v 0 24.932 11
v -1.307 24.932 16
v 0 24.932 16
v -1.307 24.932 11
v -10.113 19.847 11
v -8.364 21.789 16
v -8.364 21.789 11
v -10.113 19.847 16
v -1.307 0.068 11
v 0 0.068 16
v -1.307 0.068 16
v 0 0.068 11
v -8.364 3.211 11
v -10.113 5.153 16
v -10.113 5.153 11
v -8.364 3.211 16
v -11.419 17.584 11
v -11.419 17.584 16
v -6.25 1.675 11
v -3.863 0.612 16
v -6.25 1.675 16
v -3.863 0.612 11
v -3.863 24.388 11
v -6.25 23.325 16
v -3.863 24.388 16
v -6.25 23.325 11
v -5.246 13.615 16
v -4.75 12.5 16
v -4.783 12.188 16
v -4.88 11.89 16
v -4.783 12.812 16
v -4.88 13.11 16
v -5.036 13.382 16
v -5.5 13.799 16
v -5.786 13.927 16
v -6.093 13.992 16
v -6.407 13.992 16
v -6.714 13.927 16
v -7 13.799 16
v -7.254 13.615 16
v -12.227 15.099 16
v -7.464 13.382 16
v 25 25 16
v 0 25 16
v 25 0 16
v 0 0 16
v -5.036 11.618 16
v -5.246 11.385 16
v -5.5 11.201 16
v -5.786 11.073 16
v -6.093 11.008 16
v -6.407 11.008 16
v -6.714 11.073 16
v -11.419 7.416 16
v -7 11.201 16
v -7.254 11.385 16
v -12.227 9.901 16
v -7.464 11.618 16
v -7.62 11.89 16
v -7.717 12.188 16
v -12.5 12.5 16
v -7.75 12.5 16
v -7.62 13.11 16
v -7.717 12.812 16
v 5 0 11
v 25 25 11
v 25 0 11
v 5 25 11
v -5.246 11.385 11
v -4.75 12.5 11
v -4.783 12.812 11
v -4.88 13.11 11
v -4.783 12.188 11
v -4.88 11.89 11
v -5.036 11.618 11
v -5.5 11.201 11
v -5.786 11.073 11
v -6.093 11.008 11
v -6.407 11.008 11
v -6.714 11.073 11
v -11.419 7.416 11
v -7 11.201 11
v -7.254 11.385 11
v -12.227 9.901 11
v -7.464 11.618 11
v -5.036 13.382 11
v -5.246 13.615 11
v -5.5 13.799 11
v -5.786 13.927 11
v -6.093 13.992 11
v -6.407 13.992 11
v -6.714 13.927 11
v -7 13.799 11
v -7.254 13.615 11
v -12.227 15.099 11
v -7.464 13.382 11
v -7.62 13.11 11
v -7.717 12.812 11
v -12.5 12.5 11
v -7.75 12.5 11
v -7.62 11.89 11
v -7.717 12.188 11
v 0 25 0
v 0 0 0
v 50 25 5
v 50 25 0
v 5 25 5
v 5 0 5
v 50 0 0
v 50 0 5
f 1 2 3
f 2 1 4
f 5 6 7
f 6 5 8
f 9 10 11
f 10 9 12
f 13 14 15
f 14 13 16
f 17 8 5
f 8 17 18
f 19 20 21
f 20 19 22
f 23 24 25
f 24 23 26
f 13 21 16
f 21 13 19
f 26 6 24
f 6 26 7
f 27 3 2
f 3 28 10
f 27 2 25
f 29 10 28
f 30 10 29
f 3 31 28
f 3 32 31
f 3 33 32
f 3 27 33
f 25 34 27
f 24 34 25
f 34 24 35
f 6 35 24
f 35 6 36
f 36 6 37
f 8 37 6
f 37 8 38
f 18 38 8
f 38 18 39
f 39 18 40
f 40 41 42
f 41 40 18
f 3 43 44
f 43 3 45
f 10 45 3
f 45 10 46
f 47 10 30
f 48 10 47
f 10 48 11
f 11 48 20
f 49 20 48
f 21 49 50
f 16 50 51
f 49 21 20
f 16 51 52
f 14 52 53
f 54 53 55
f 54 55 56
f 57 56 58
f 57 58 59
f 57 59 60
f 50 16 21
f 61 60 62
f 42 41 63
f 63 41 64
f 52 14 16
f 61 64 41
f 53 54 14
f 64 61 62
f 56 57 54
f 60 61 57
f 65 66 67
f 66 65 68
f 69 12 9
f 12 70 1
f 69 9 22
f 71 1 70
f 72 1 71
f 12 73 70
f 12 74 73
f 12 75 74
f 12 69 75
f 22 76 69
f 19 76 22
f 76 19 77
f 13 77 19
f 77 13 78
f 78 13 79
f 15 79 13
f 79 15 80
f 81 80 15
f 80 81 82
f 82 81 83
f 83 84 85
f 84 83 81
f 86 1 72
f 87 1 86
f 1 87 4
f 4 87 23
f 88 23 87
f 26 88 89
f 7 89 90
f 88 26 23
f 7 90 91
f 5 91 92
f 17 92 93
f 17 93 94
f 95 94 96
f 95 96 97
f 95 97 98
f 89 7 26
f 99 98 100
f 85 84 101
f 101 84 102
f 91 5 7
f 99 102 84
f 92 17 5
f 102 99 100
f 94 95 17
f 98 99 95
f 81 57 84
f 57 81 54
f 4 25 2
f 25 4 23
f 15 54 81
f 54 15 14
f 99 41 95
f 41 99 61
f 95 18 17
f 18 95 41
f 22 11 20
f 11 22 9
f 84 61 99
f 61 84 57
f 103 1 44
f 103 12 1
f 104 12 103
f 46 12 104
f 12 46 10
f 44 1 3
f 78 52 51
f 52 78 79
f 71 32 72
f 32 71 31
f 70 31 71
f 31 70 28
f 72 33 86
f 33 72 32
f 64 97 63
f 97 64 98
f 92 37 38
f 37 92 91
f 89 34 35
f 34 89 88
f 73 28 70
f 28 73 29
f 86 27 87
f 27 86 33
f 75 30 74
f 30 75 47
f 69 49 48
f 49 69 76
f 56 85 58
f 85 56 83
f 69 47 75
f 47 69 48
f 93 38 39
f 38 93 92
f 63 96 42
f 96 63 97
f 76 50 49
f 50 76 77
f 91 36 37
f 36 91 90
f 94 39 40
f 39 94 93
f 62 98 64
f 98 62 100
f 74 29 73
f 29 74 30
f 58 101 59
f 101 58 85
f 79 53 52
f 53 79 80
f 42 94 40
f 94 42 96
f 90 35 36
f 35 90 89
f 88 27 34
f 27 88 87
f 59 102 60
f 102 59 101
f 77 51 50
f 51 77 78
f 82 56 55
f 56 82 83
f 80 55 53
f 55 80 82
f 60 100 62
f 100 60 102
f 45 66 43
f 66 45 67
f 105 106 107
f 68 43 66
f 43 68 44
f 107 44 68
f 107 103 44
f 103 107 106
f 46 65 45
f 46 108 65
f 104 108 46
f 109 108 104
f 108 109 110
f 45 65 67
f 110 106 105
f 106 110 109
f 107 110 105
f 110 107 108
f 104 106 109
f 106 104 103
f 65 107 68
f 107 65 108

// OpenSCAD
// Author: Charlie Snyder
// Twitter Handle: @mjrsnyder

$fn=30;

width=25;
baseLength=50;
glassThickness=6;
clipLength=20;
screwDiameter=3;

module base (length, width){
    cube([length, width, 5]);
}

module glassSeparator (thickness, width) {
    cube([5,width,thickness]);
}

module clip(length, width, screwDiameter){
    cube([length+5,width,5]);
    difference() {
        translate([0, width/2]){
            cylinder(r=width/2, h=5);
        }
        cube([width/2,width,5]);
        translate([-width/4, width/2]){
            cylinder(r=screwDiameter/2, h=5);
        }
    }
}

base(baseLength, width);
translate([0,0,5]){
    glassSeparator(glassThickness, width);
}

translate([0,0,glassThickness +5]){
    clip(clipLength, width, screwDiameter);
}
